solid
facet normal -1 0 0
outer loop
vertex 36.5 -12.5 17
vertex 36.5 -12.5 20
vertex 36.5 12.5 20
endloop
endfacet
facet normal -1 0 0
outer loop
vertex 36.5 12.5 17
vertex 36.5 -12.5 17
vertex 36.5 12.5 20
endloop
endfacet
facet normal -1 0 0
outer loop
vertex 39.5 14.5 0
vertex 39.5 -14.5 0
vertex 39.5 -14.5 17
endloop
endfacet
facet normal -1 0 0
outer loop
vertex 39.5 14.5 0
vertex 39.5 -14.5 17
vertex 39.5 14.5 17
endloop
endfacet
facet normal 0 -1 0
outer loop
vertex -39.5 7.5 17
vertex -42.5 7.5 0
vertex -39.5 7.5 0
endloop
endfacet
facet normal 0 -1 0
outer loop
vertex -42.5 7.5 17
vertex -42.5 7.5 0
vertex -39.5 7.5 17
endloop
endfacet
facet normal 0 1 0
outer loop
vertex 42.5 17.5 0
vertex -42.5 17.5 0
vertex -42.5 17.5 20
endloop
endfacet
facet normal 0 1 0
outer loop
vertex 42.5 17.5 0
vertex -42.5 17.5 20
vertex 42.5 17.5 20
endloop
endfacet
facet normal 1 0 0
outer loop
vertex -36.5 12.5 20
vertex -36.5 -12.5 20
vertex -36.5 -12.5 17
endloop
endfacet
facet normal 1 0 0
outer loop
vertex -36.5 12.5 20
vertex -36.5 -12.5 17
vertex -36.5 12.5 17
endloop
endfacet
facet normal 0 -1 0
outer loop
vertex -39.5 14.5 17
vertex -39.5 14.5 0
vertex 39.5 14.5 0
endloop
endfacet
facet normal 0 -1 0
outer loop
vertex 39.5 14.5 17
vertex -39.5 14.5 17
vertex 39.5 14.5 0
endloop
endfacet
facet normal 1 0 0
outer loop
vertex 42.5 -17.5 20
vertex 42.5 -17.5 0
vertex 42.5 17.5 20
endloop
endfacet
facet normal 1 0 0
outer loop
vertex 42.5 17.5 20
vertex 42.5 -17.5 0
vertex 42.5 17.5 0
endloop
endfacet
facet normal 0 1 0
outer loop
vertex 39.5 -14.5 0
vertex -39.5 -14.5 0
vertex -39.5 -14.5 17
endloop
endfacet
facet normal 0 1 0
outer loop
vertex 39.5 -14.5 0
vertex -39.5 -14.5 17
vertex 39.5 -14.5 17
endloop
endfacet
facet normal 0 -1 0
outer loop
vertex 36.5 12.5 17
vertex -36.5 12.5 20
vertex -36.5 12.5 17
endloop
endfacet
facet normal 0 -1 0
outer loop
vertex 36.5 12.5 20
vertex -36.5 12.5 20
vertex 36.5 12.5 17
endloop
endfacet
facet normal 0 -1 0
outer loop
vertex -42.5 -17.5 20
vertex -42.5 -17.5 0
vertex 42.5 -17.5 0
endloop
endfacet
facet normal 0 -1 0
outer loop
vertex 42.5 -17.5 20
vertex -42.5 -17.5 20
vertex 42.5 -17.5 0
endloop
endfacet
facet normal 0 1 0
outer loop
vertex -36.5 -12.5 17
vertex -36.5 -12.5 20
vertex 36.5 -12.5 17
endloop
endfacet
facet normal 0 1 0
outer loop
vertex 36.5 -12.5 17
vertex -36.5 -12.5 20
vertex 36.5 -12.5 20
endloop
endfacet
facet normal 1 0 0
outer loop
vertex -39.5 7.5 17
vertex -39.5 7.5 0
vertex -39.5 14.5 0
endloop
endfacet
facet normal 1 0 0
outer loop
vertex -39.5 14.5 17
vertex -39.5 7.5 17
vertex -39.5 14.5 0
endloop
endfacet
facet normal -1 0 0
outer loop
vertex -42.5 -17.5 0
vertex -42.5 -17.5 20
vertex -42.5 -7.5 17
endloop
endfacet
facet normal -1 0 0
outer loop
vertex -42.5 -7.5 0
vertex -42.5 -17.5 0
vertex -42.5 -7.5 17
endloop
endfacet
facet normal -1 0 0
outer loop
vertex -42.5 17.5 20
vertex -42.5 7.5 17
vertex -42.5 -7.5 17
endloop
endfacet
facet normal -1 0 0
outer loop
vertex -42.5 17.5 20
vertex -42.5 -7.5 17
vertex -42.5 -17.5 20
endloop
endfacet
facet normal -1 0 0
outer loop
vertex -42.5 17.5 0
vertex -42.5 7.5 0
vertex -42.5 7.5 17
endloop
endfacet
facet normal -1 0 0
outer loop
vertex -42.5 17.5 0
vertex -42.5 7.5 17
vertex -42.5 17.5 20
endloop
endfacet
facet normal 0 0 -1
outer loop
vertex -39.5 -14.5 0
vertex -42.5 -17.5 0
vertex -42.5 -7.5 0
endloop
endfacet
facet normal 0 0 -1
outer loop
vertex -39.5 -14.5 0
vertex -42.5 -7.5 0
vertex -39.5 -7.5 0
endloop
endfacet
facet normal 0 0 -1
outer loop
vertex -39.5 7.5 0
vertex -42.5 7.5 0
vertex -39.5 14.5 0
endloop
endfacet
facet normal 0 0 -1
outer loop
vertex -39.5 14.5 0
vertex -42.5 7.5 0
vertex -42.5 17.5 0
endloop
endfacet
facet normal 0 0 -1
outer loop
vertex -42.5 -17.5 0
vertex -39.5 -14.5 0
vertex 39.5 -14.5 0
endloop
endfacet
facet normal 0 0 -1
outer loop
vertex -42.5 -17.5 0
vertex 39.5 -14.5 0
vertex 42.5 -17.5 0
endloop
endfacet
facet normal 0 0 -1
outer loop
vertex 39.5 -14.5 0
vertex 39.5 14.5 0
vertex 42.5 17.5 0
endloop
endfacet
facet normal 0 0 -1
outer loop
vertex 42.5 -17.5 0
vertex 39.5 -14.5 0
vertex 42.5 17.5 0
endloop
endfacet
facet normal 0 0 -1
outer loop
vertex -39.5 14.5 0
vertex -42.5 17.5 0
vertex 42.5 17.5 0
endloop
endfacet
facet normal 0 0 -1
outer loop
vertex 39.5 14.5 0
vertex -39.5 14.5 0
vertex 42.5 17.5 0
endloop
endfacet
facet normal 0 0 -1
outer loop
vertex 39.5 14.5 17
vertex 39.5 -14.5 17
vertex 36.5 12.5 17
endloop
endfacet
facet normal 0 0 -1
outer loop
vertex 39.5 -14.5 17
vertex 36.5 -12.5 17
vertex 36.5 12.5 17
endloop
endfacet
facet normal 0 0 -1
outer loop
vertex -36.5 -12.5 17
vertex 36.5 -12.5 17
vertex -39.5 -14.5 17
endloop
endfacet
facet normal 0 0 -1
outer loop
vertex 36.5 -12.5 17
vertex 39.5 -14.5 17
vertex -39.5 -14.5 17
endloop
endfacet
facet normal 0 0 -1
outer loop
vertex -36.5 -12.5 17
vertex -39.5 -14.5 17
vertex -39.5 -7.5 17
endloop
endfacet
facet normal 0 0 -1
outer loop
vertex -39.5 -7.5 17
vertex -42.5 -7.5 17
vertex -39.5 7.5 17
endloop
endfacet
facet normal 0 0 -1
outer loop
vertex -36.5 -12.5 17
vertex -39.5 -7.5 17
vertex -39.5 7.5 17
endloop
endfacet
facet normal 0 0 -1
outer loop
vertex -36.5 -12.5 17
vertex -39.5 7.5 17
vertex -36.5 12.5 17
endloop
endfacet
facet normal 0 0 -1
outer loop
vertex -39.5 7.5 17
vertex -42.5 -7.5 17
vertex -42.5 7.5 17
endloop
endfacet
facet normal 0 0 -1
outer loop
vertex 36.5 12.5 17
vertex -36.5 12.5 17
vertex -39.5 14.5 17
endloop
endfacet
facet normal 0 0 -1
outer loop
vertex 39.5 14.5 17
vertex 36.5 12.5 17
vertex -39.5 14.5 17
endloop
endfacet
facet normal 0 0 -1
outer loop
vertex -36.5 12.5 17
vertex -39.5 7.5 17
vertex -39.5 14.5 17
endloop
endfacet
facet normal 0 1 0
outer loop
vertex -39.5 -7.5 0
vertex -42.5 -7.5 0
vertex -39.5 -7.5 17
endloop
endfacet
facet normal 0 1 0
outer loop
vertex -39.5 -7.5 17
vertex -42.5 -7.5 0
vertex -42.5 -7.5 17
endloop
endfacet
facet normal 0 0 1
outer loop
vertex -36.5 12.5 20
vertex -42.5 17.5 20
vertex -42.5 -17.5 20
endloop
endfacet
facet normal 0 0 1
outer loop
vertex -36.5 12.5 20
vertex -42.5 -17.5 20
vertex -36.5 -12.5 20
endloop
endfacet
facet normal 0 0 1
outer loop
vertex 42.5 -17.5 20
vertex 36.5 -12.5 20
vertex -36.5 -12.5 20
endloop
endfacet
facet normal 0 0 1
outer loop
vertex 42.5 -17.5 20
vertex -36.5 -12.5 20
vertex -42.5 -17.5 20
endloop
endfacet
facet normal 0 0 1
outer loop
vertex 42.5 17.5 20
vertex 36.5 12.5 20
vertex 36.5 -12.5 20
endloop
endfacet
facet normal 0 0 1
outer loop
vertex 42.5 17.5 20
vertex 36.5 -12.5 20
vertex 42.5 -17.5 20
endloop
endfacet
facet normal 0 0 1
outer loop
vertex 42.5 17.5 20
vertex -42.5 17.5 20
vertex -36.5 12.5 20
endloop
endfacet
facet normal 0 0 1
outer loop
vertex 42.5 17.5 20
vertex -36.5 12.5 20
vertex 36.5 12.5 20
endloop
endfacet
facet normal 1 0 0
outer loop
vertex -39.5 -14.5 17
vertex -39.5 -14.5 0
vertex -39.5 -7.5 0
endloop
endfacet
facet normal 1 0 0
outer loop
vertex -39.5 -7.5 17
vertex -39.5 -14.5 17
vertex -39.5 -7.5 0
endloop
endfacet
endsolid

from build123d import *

# Parameters (mm, degrees)
SKETCH1_W           = 85
SKETCH1_H           = 35
BOSS_EXTRUDE1_DEPTH = 20
SHELL1_T            = -3
SKETCH3_W           = 17
SKETCH3_H           = 15
CUT_EXTRUDE1_DEPTH  = 20
SKETCH4_W           = 73
SKETCH4_H           = 25
CUT_EXTRUDE2_DEPTH  = 20


with BuildPart() as part:
    # Sketch1 → Boss-Extrude1 (new body)
    with BuildSketch(Plane.XY):
        Rectangle(SKETCH1_W, SKETCH1_H)
    extrude(amount=BOSS_EXTRUDE1_DEPTH)

    # Shell1
    shell1_openings = [part.faces().sort_by_distance(p)[0] for p in [
        (0, 0, 0),
    ]]
    offset(amount=SHELL1_T, openings=shell1_openings, kind=Kind.INTERSECTION)

    # Sketch3 → Cut-Extrude1 (cut)
    with BuildSketch(Plane.ZY.offset(42.5)):
        with Locations((8.5, 0)):
            Rectangle(SKETCH3_W, SKETCH3_H)
    extrude(amount=-CUT_EXTRUDE1_DEPTH, mode=Mode.SUBTRACT)

    # Sketch4 → Cut-Extrude2 (cut)
    with BuildSketch(Plane.XY.offset(20)):
        Rectangle(SKETCH4_W, SKETCH4_H)
    extrude(amount=-CUT_EXTRUDE2_DEPTH, mode=Mode.SUBTRACT)


solid = part.part
